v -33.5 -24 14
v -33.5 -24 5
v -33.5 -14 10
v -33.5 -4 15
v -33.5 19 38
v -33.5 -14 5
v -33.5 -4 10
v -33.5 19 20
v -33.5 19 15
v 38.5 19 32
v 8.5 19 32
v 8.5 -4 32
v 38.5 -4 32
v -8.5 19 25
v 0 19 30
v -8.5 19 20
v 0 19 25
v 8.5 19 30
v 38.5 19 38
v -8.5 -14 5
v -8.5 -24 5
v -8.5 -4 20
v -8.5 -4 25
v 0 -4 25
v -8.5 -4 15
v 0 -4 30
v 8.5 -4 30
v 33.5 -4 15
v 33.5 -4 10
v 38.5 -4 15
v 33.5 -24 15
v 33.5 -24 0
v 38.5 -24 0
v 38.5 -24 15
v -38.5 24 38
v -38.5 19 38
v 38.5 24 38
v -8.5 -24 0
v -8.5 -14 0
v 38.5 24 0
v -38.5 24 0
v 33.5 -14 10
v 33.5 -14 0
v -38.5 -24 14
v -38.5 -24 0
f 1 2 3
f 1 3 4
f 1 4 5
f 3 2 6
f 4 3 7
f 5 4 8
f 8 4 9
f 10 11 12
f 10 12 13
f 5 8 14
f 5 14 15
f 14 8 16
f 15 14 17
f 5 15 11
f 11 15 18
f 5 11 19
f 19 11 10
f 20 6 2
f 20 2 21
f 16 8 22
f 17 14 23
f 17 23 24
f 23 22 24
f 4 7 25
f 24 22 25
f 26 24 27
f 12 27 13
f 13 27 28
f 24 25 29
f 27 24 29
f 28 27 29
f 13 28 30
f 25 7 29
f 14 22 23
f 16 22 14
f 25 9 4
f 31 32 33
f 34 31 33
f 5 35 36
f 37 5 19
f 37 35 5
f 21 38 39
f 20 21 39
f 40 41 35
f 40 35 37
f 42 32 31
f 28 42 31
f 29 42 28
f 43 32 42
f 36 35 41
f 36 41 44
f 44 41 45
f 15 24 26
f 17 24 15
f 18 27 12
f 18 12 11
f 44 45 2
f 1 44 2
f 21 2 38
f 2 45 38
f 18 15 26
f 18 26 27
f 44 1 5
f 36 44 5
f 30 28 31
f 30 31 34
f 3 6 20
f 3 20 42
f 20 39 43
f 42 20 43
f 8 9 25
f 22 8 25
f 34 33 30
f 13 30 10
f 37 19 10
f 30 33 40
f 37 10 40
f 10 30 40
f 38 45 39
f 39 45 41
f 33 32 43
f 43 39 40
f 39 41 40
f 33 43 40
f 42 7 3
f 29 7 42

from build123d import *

# Parameters (mm, degrees)
F1_DEPTH  = 38
F3_DEPTH  = 25
F4_DEPTH  = 38
F0_W      = 25
F0_H      = 10
F5_DEPTH  = 5
F6_DEPTH  = 10
F7_DEPTH  = 15
F0_W_2    = 5
F0_H_2    = 5
F8_DEPTH  = 38
F0_H_3    = 23
F9_DEPTH  = 32
F11_DEPTH = 15
F12_DEPTH = 20
F0_W_3    = 8.5
F13_DEPTH = 25
F14_DEPTH = 30
F15_DEPTH = 32


# Not quite as in the source:
# - the program builds the solid bodies; features that only make, move or delete a surface that nothing else refers to are left out


with BuildPart() as f1:
    # F0 (on Top) → F1 (new body)
    with BuildSketch(Plane.XY):
        Polygon((-33.5, 19), (-38.5, 19), (-38.5, -24), (-33.5, -24), (-33.5, -14), (-33.5, -4), align=None)
    extrude(amount=F1_DEPTH)

    # F2 (on face) → F3 (cut)
    with BuildSketch(Plane.YZ.offset(-33.5)):
        Polygon((-24, 38), (-24, 14), (19, 38), align=None)
    extrude(amount=-F3_DEPTH, mode=Mode.SUBTRACT)

    # F0 (on Top) → F4 (join)
    with BuildSketch(Plane.XY):
        Polygon((33.5, 19), (33.5, 24), (-38.5, 24), (-38.5, 19), (-33.5, 19), (-8.5, 19), (0, 19), (8.5, 19), align=None)
    extrude(amount=F4_DEPTH)

    # F0 (on Top) → F5 (join)
    with BuildSketch(Plane.XY):
        with Locations((-21, -19)):
            Rectangle(F0_W, F0_H)
    extrude(amount=F5_DEPTH)

    # F0 (on Top) → F6 (join)
    with BuildSketch(Plane.XY):
        Polygon((33.5, -14), (33.5, -4), (8.5, -4), (0, -4), (-8.5, -4), (-33.5, -4), (-33.5, -14), (-8.5, -14), align=None)
    extrude(amount=F6_DEPTH)

    # F0 (on Top) → F7 (join)
    with BuildSketch(Plane.XY):
        Polygon((38.5, -24), (38.5, -4), (33.5, -4), (33.5, -14), (33.5, -24), align=None)
    extrude(amount=F7_DEPTH)

    # F0 (on Top) → F8 (join)
    with BuildSketch(Plane.XY):
        with Locations((36, 21.5)):
            Rectangle(F0_W_2, F0_H_2)
    extrude(amount=F8_DEPTH)

    # F0 (on Top) → F9 (join)
    with BuildSketch(Plane.XY):
        with Locations((36, 7.5)):
            Rectangle(F0_W_2, F0_H_3)
    extrude(amount=F9_DEPTH)

    # F0 (on Top) → F11 (join)
    with BuildSketch(Plane.XY):
        Polygon((-8.5, -4), (-33.5, 19), (-33.5, -4), align=None)
    extrude(amount=F11_DEPTH)

    # F0 (on Top) → F12 (join)
    with BuildSketch(Plane.XY):
        Polygon((-8.5, 19), (-33.5, 19), (-8.5, -4), align=None)
    extrude(amount=F12_DEPTH)

    # F0 (on Top) → F13 (join)
    with BuildSketch(Plane.XY):
        with Locations((-4.25, 7.5)):
            Rectangle(F0_W_3, F0_H_3)
    extrude(amount=F13_DEPTH)

    # F0 (on Top) → F14 (join)
    with BuildSketch(Plane.XY):
        with Locations((4.25, 7.5)):
            Rectangle(F0_W_3, F0_H_3)
    extrude(amount=F14_DEPTH)

    # F0 (on Top) → F15 (join)
    with BuildSketch(Plane.XY):
        with Locations((21, 7.5)):
            Rectangle(F0_W, F0_H_3)
    extrude(amount=F15_DEPTH)


solid = f1.part
